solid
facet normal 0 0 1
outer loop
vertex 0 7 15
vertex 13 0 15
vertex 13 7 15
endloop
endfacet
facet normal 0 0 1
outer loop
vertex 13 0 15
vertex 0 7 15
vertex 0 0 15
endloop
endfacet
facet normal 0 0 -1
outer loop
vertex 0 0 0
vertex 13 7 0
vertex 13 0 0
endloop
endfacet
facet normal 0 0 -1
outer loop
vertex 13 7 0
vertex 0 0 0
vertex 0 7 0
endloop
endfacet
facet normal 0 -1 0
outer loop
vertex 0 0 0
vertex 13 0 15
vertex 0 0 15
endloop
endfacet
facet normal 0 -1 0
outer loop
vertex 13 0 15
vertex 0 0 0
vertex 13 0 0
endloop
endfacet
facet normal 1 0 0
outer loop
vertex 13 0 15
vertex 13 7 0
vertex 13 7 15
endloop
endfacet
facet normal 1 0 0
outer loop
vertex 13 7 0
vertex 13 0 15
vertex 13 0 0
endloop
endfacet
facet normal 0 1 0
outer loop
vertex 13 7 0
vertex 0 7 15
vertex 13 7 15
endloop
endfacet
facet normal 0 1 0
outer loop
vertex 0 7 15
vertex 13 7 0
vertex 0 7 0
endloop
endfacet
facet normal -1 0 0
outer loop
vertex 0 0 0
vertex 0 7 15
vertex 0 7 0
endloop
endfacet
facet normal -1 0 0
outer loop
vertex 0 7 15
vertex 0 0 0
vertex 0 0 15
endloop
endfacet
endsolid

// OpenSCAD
// Generated by SolidPython 1.0.1 on 2020-07-29 00:46:55


cube(size = [13, 7, 15]);
/***********************************************
*********      SolidPython code:      **********
************************************************
 
# import packages: SolidPython
from solid import *
from solid.utils import *
from itertools import chain, combinations, permutations


class Resize:

    def __init__(self, scad_file):
        self.scad_file = scad_file
        #self.scad_file = import_scad(scad_file)
        # cone/cylinder param:
        self.r1 = 0
        self.r2 = 0
        self.h = 0
        # rectangular prism param:
        self.w = 0
        self.l = 0
        # ellipse param:
        self.r = 0

    # import OpenScad code (file name corresponds to shape)


    # classify shape + parameters
    def assign(self, param1, param2, param3):
        if self.scad_file == 'cone.scad':
            self.r1 = param1
            self.r2 = param2
            self.h = param3
        elif self.scad_file == 'cylinder.scad':
            self.r1 = param1
            self.r2 = param2
            self.h = param3
        elif self.scad_file == 'rectangularPrism.scad':
            self.h = param1
            self.l = param2
            self.w = param3
        else:
            self.r = param1
            self.h = param2

    # resize parameters
    def iterate(self):
        x = range(3, 20, 2)
        i = 1
        if self.scad_file == 'cone.scad':
            tempList = list(permutations(x, 2))
            for temp in tempList:
                param1 = temp[0]
                param2 = temp[1]
                filepath = 'produced_scad_files/' + 'cone' + str(param1) + '_' + str(param2) + '_' + '.scad'
                scad_render_to_file(cylinder(h=param1, r1=param2, r2=0), filepath)

        elif self.scad_file == 'cylinder.scad':
            tempList = list(permutations(x, 3))
            for temp in tempList:
                param1 = temp[0]
                param2 = temp[1]
                filepath = 'produced_scad_files/' + 'cylinder' + str(param1) + '_' + str(param2) + '_' + '.scad'
                scad_render_to_file(cylinder(h=param1, r1=param2, r2=param2), filepath)

        elif self.scad_file == 'rectangularPrism.scad':
            tempList = list(permutations(x, 3))
            for temp in tempList:
                param1 = temp[0]
                param2 = temp[1]
                param3 = temp[2]
                filepath = 'produced_scad_files/' + 'rectangularPrism' + str(param1) + '_' + str(param2) + '_' + str(
                    param3) + '.scad'
                scad_render_to_file(cube(size=(param1, param2, param3)), filepath)

        elif self.scad_file == 'ellipse.scad':
            tempList = list(permutations(x, 4))
            for temp in tempList:
                param1 = temp[0]
                param2 = temp[1]
                param3 = temp[2]
                param4 = temp[3]
                filepath = 'produced_scad_files/' + 'ellipse' + str(param1) + '_' + str(param2) + '_' + str(param3) + '_' + str(param4) + '.scad'
                scad_render_to_file(scale([param1, param2, param3])(sphere(r=param4)), filepath)

    def render_to_scadfile(self):
        scad_render_to_file(scad, 'example.scad') 
 
************************************************/
